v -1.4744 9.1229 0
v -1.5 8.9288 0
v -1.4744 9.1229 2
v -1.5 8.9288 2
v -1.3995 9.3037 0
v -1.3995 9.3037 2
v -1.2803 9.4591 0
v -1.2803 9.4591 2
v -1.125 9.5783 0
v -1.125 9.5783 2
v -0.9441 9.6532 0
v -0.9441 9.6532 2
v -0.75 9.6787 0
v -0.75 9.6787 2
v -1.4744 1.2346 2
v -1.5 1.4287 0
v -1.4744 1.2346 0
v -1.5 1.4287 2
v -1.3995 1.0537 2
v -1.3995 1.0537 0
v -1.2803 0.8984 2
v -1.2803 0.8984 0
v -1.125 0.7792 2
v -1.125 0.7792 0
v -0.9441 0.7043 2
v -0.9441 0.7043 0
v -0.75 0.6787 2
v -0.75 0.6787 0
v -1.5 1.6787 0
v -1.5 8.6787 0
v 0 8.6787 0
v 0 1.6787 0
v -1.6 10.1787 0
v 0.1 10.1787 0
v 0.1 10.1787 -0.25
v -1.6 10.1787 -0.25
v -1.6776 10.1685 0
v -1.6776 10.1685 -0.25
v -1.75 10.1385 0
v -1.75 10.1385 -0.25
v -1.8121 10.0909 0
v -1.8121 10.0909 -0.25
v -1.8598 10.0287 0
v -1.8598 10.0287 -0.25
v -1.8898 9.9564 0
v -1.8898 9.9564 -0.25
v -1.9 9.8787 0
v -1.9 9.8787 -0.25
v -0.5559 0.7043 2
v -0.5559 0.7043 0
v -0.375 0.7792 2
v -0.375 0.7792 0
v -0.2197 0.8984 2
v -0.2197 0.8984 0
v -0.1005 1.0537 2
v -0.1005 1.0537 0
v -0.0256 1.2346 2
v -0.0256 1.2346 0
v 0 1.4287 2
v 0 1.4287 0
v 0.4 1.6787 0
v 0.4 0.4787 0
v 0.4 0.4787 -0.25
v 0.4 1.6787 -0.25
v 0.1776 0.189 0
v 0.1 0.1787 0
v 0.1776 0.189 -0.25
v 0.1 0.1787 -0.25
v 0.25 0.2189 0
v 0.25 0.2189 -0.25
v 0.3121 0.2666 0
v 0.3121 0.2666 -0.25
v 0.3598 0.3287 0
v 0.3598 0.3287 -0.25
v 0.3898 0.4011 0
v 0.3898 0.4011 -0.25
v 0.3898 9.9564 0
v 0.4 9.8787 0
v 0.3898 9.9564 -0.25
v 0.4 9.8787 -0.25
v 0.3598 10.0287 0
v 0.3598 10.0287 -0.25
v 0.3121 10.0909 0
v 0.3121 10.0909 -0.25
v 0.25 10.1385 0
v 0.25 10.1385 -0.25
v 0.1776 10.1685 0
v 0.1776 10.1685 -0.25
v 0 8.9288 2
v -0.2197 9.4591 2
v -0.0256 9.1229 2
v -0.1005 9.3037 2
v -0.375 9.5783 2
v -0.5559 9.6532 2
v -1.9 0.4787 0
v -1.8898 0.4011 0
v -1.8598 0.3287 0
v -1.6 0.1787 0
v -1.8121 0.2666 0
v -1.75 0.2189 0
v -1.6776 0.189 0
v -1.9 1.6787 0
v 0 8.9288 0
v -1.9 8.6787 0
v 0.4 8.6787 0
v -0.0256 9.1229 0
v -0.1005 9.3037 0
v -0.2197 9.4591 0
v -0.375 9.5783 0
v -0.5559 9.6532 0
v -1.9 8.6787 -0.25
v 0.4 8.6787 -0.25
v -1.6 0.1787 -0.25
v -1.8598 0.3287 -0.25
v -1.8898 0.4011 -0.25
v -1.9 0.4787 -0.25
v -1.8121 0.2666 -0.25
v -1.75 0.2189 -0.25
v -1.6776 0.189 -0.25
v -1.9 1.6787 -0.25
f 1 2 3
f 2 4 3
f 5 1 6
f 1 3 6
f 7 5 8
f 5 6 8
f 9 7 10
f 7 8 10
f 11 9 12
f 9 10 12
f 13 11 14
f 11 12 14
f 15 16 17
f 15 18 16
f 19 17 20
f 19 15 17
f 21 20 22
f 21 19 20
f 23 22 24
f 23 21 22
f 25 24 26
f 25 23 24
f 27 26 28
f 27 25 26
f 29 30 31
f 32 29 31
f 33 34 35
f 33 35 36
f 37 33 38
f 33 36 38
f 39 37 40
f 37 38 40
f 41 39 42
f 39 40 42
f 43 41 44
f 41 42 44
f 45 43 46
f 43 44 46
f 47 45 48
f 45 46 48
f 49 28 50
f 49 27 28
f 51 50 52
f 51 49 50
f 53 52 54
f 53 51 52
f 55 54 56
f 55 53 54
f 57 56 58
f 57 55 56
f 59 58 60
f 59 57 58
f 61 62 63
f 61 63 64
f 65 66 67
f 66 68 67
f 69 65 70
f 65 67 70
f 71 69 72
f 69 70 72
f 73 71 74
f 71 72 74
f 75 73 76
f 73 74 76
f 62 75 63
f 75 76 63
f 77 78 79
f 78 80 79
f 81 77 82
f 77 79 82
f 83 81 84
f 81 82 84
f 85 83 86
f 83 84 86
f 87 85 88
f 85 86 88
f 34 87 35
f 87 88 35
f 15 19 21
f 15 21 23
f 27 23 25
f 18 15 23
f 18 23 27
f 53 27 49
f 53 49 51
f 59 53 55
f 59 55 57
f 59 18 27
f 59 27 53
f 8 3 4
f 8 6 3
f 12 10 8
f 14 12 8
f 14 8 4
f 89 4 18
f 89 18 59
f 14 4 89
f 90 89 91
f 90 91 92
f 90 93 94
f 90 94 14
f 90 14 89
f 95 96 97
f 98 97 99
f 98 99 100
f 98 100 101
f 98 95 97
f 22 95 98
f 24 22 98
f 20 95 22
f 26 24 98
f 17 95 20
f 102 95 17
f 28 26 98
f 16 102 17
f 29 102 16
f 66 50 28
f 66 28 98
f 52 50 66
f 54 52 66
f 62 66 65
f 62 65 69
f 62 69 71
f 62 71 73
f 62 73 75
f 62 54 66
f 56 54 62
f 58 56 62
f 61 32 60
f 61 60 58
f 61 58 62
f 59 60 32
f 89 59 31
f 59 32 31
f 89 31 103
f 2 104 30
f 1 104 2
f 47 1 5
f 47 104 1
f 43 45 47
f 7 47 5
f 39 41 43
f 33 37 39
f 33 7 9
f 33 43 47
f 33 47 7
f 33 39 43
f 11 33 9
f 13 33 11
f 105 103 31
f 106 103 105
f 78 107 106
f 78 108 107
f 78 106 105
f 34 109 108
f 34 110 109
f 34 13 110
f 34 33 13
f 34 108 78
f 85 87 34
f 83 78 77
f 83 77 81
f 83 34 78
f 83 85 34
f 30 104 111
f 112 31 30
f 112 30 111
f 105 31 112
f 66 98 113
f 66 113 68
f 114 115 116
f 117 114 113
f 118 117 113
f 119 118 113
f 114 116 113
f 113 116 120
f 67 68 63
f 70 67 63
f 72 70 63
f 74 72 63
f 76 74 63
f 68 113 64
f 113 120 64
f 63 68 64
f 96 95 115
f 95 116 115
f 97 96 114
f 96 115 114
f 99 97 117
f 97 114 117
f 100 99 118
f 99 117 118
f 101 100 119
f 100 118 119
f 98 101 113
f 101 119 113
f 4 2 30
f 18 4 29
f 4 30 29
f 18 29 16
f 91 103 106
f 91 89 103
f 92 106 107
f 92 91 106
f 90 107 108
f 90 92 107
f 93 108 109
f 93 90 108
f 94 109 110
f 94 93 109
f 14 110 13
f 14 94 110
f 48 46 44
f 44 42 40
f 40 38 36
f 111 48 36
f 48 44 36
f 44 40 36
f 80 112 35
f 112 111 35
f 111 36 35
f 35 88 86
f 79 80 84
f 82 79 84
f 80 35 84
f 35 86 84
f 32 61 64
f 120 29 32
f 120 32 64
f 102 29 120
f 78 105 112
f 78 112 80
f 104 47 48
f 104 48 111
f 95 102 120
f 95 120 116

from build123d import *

# Parameters (mm, degrees)
F0_W     = 1.5
F0_H     = 1
F0_H_2   = 7
F1_DEPTH = 2
F2_DEPTH = 0.25
F3_R     = 0.74999
F4_R     = 0.3


# Not quite as in the source:
# - a fillet or chamfer is up to 0.001 mm smaller than in the source, because OpenCascade refuses the exact size
# - a feature names something its author has since deleted; it is built from what else it names


with BuildPart() as f1:
    # F0 (on Top) → F1 (new body)
    with BuildSketch(Plane.XY):
        with Locations((-0.75, 9.1787409857)):
            Rectangle(F0_W, F0_H)
        with Locations((-0.75, 5.1787409857)):
            Rectangle(F0_W, F0_H_2)
        with Locations((-0.75, 1.1787409857)):
            Rectangle(F0_W, F0_H)
    extrude(amount=F1_DEPTH)

    # F0 (on Top) → F2 (join)
    with BuildSketch(Plane.XY):
        with Locations((-0.75, 1.1787409857)):
            Rectangle(F0_W, F0_H)
        Polygon((-1.5, 0.6787409857), (-1.5, 1.6787409857), (-1.9, 1.6787409857), (-1.9, 0.1787409857), (0.4, 0.1787409857), (0.4, 1.6787409857), (0, 1.6787409857), (0, 0.6787409857), align=None)
        Polygon((-1.5, 8.6787409857), (-1.5, 9.6787409857), (0, 9.6787409857), (0, 8.6787409857), (0.4, 8.6787409857), (0.4, 10.1787409857), (-1.9, 10.1787409857), (-1.9, 8.6787409857), align=None)
        with Locations((-0.75, 9.1787409857)):
            Rectangle(F0_W, F0_H)
    extrude(amount=-F2_DEPTH)

    # F3 (radius 0.75 in the source; OpenCascade refuses exactly that, so slightly less here)
    f3_edges = [f1.edges().sort_by_distance(p)[0] for p in [
        (0, 9.678741, 1),
        (-1.5, 9.678741, 1),
        (0, 0.678741, 1),
        (-1.5, 0.678741, 1),
    ]]
    fillet(f3_edges, radius=F3_R)

    # F4
    f4_edges = [f1.edges().sort_by_distance(p)[0] for p in [
        (0.4, 10.178741, -0.125),
        (-1.9, 10.178741, -0.125),
        (0.4, 0.178741, -0.125),
        (-1.9, 0.178741, -0.125),
    ]]
    fillet(f4_edges, radius=F4_R)


solid = f1.part
